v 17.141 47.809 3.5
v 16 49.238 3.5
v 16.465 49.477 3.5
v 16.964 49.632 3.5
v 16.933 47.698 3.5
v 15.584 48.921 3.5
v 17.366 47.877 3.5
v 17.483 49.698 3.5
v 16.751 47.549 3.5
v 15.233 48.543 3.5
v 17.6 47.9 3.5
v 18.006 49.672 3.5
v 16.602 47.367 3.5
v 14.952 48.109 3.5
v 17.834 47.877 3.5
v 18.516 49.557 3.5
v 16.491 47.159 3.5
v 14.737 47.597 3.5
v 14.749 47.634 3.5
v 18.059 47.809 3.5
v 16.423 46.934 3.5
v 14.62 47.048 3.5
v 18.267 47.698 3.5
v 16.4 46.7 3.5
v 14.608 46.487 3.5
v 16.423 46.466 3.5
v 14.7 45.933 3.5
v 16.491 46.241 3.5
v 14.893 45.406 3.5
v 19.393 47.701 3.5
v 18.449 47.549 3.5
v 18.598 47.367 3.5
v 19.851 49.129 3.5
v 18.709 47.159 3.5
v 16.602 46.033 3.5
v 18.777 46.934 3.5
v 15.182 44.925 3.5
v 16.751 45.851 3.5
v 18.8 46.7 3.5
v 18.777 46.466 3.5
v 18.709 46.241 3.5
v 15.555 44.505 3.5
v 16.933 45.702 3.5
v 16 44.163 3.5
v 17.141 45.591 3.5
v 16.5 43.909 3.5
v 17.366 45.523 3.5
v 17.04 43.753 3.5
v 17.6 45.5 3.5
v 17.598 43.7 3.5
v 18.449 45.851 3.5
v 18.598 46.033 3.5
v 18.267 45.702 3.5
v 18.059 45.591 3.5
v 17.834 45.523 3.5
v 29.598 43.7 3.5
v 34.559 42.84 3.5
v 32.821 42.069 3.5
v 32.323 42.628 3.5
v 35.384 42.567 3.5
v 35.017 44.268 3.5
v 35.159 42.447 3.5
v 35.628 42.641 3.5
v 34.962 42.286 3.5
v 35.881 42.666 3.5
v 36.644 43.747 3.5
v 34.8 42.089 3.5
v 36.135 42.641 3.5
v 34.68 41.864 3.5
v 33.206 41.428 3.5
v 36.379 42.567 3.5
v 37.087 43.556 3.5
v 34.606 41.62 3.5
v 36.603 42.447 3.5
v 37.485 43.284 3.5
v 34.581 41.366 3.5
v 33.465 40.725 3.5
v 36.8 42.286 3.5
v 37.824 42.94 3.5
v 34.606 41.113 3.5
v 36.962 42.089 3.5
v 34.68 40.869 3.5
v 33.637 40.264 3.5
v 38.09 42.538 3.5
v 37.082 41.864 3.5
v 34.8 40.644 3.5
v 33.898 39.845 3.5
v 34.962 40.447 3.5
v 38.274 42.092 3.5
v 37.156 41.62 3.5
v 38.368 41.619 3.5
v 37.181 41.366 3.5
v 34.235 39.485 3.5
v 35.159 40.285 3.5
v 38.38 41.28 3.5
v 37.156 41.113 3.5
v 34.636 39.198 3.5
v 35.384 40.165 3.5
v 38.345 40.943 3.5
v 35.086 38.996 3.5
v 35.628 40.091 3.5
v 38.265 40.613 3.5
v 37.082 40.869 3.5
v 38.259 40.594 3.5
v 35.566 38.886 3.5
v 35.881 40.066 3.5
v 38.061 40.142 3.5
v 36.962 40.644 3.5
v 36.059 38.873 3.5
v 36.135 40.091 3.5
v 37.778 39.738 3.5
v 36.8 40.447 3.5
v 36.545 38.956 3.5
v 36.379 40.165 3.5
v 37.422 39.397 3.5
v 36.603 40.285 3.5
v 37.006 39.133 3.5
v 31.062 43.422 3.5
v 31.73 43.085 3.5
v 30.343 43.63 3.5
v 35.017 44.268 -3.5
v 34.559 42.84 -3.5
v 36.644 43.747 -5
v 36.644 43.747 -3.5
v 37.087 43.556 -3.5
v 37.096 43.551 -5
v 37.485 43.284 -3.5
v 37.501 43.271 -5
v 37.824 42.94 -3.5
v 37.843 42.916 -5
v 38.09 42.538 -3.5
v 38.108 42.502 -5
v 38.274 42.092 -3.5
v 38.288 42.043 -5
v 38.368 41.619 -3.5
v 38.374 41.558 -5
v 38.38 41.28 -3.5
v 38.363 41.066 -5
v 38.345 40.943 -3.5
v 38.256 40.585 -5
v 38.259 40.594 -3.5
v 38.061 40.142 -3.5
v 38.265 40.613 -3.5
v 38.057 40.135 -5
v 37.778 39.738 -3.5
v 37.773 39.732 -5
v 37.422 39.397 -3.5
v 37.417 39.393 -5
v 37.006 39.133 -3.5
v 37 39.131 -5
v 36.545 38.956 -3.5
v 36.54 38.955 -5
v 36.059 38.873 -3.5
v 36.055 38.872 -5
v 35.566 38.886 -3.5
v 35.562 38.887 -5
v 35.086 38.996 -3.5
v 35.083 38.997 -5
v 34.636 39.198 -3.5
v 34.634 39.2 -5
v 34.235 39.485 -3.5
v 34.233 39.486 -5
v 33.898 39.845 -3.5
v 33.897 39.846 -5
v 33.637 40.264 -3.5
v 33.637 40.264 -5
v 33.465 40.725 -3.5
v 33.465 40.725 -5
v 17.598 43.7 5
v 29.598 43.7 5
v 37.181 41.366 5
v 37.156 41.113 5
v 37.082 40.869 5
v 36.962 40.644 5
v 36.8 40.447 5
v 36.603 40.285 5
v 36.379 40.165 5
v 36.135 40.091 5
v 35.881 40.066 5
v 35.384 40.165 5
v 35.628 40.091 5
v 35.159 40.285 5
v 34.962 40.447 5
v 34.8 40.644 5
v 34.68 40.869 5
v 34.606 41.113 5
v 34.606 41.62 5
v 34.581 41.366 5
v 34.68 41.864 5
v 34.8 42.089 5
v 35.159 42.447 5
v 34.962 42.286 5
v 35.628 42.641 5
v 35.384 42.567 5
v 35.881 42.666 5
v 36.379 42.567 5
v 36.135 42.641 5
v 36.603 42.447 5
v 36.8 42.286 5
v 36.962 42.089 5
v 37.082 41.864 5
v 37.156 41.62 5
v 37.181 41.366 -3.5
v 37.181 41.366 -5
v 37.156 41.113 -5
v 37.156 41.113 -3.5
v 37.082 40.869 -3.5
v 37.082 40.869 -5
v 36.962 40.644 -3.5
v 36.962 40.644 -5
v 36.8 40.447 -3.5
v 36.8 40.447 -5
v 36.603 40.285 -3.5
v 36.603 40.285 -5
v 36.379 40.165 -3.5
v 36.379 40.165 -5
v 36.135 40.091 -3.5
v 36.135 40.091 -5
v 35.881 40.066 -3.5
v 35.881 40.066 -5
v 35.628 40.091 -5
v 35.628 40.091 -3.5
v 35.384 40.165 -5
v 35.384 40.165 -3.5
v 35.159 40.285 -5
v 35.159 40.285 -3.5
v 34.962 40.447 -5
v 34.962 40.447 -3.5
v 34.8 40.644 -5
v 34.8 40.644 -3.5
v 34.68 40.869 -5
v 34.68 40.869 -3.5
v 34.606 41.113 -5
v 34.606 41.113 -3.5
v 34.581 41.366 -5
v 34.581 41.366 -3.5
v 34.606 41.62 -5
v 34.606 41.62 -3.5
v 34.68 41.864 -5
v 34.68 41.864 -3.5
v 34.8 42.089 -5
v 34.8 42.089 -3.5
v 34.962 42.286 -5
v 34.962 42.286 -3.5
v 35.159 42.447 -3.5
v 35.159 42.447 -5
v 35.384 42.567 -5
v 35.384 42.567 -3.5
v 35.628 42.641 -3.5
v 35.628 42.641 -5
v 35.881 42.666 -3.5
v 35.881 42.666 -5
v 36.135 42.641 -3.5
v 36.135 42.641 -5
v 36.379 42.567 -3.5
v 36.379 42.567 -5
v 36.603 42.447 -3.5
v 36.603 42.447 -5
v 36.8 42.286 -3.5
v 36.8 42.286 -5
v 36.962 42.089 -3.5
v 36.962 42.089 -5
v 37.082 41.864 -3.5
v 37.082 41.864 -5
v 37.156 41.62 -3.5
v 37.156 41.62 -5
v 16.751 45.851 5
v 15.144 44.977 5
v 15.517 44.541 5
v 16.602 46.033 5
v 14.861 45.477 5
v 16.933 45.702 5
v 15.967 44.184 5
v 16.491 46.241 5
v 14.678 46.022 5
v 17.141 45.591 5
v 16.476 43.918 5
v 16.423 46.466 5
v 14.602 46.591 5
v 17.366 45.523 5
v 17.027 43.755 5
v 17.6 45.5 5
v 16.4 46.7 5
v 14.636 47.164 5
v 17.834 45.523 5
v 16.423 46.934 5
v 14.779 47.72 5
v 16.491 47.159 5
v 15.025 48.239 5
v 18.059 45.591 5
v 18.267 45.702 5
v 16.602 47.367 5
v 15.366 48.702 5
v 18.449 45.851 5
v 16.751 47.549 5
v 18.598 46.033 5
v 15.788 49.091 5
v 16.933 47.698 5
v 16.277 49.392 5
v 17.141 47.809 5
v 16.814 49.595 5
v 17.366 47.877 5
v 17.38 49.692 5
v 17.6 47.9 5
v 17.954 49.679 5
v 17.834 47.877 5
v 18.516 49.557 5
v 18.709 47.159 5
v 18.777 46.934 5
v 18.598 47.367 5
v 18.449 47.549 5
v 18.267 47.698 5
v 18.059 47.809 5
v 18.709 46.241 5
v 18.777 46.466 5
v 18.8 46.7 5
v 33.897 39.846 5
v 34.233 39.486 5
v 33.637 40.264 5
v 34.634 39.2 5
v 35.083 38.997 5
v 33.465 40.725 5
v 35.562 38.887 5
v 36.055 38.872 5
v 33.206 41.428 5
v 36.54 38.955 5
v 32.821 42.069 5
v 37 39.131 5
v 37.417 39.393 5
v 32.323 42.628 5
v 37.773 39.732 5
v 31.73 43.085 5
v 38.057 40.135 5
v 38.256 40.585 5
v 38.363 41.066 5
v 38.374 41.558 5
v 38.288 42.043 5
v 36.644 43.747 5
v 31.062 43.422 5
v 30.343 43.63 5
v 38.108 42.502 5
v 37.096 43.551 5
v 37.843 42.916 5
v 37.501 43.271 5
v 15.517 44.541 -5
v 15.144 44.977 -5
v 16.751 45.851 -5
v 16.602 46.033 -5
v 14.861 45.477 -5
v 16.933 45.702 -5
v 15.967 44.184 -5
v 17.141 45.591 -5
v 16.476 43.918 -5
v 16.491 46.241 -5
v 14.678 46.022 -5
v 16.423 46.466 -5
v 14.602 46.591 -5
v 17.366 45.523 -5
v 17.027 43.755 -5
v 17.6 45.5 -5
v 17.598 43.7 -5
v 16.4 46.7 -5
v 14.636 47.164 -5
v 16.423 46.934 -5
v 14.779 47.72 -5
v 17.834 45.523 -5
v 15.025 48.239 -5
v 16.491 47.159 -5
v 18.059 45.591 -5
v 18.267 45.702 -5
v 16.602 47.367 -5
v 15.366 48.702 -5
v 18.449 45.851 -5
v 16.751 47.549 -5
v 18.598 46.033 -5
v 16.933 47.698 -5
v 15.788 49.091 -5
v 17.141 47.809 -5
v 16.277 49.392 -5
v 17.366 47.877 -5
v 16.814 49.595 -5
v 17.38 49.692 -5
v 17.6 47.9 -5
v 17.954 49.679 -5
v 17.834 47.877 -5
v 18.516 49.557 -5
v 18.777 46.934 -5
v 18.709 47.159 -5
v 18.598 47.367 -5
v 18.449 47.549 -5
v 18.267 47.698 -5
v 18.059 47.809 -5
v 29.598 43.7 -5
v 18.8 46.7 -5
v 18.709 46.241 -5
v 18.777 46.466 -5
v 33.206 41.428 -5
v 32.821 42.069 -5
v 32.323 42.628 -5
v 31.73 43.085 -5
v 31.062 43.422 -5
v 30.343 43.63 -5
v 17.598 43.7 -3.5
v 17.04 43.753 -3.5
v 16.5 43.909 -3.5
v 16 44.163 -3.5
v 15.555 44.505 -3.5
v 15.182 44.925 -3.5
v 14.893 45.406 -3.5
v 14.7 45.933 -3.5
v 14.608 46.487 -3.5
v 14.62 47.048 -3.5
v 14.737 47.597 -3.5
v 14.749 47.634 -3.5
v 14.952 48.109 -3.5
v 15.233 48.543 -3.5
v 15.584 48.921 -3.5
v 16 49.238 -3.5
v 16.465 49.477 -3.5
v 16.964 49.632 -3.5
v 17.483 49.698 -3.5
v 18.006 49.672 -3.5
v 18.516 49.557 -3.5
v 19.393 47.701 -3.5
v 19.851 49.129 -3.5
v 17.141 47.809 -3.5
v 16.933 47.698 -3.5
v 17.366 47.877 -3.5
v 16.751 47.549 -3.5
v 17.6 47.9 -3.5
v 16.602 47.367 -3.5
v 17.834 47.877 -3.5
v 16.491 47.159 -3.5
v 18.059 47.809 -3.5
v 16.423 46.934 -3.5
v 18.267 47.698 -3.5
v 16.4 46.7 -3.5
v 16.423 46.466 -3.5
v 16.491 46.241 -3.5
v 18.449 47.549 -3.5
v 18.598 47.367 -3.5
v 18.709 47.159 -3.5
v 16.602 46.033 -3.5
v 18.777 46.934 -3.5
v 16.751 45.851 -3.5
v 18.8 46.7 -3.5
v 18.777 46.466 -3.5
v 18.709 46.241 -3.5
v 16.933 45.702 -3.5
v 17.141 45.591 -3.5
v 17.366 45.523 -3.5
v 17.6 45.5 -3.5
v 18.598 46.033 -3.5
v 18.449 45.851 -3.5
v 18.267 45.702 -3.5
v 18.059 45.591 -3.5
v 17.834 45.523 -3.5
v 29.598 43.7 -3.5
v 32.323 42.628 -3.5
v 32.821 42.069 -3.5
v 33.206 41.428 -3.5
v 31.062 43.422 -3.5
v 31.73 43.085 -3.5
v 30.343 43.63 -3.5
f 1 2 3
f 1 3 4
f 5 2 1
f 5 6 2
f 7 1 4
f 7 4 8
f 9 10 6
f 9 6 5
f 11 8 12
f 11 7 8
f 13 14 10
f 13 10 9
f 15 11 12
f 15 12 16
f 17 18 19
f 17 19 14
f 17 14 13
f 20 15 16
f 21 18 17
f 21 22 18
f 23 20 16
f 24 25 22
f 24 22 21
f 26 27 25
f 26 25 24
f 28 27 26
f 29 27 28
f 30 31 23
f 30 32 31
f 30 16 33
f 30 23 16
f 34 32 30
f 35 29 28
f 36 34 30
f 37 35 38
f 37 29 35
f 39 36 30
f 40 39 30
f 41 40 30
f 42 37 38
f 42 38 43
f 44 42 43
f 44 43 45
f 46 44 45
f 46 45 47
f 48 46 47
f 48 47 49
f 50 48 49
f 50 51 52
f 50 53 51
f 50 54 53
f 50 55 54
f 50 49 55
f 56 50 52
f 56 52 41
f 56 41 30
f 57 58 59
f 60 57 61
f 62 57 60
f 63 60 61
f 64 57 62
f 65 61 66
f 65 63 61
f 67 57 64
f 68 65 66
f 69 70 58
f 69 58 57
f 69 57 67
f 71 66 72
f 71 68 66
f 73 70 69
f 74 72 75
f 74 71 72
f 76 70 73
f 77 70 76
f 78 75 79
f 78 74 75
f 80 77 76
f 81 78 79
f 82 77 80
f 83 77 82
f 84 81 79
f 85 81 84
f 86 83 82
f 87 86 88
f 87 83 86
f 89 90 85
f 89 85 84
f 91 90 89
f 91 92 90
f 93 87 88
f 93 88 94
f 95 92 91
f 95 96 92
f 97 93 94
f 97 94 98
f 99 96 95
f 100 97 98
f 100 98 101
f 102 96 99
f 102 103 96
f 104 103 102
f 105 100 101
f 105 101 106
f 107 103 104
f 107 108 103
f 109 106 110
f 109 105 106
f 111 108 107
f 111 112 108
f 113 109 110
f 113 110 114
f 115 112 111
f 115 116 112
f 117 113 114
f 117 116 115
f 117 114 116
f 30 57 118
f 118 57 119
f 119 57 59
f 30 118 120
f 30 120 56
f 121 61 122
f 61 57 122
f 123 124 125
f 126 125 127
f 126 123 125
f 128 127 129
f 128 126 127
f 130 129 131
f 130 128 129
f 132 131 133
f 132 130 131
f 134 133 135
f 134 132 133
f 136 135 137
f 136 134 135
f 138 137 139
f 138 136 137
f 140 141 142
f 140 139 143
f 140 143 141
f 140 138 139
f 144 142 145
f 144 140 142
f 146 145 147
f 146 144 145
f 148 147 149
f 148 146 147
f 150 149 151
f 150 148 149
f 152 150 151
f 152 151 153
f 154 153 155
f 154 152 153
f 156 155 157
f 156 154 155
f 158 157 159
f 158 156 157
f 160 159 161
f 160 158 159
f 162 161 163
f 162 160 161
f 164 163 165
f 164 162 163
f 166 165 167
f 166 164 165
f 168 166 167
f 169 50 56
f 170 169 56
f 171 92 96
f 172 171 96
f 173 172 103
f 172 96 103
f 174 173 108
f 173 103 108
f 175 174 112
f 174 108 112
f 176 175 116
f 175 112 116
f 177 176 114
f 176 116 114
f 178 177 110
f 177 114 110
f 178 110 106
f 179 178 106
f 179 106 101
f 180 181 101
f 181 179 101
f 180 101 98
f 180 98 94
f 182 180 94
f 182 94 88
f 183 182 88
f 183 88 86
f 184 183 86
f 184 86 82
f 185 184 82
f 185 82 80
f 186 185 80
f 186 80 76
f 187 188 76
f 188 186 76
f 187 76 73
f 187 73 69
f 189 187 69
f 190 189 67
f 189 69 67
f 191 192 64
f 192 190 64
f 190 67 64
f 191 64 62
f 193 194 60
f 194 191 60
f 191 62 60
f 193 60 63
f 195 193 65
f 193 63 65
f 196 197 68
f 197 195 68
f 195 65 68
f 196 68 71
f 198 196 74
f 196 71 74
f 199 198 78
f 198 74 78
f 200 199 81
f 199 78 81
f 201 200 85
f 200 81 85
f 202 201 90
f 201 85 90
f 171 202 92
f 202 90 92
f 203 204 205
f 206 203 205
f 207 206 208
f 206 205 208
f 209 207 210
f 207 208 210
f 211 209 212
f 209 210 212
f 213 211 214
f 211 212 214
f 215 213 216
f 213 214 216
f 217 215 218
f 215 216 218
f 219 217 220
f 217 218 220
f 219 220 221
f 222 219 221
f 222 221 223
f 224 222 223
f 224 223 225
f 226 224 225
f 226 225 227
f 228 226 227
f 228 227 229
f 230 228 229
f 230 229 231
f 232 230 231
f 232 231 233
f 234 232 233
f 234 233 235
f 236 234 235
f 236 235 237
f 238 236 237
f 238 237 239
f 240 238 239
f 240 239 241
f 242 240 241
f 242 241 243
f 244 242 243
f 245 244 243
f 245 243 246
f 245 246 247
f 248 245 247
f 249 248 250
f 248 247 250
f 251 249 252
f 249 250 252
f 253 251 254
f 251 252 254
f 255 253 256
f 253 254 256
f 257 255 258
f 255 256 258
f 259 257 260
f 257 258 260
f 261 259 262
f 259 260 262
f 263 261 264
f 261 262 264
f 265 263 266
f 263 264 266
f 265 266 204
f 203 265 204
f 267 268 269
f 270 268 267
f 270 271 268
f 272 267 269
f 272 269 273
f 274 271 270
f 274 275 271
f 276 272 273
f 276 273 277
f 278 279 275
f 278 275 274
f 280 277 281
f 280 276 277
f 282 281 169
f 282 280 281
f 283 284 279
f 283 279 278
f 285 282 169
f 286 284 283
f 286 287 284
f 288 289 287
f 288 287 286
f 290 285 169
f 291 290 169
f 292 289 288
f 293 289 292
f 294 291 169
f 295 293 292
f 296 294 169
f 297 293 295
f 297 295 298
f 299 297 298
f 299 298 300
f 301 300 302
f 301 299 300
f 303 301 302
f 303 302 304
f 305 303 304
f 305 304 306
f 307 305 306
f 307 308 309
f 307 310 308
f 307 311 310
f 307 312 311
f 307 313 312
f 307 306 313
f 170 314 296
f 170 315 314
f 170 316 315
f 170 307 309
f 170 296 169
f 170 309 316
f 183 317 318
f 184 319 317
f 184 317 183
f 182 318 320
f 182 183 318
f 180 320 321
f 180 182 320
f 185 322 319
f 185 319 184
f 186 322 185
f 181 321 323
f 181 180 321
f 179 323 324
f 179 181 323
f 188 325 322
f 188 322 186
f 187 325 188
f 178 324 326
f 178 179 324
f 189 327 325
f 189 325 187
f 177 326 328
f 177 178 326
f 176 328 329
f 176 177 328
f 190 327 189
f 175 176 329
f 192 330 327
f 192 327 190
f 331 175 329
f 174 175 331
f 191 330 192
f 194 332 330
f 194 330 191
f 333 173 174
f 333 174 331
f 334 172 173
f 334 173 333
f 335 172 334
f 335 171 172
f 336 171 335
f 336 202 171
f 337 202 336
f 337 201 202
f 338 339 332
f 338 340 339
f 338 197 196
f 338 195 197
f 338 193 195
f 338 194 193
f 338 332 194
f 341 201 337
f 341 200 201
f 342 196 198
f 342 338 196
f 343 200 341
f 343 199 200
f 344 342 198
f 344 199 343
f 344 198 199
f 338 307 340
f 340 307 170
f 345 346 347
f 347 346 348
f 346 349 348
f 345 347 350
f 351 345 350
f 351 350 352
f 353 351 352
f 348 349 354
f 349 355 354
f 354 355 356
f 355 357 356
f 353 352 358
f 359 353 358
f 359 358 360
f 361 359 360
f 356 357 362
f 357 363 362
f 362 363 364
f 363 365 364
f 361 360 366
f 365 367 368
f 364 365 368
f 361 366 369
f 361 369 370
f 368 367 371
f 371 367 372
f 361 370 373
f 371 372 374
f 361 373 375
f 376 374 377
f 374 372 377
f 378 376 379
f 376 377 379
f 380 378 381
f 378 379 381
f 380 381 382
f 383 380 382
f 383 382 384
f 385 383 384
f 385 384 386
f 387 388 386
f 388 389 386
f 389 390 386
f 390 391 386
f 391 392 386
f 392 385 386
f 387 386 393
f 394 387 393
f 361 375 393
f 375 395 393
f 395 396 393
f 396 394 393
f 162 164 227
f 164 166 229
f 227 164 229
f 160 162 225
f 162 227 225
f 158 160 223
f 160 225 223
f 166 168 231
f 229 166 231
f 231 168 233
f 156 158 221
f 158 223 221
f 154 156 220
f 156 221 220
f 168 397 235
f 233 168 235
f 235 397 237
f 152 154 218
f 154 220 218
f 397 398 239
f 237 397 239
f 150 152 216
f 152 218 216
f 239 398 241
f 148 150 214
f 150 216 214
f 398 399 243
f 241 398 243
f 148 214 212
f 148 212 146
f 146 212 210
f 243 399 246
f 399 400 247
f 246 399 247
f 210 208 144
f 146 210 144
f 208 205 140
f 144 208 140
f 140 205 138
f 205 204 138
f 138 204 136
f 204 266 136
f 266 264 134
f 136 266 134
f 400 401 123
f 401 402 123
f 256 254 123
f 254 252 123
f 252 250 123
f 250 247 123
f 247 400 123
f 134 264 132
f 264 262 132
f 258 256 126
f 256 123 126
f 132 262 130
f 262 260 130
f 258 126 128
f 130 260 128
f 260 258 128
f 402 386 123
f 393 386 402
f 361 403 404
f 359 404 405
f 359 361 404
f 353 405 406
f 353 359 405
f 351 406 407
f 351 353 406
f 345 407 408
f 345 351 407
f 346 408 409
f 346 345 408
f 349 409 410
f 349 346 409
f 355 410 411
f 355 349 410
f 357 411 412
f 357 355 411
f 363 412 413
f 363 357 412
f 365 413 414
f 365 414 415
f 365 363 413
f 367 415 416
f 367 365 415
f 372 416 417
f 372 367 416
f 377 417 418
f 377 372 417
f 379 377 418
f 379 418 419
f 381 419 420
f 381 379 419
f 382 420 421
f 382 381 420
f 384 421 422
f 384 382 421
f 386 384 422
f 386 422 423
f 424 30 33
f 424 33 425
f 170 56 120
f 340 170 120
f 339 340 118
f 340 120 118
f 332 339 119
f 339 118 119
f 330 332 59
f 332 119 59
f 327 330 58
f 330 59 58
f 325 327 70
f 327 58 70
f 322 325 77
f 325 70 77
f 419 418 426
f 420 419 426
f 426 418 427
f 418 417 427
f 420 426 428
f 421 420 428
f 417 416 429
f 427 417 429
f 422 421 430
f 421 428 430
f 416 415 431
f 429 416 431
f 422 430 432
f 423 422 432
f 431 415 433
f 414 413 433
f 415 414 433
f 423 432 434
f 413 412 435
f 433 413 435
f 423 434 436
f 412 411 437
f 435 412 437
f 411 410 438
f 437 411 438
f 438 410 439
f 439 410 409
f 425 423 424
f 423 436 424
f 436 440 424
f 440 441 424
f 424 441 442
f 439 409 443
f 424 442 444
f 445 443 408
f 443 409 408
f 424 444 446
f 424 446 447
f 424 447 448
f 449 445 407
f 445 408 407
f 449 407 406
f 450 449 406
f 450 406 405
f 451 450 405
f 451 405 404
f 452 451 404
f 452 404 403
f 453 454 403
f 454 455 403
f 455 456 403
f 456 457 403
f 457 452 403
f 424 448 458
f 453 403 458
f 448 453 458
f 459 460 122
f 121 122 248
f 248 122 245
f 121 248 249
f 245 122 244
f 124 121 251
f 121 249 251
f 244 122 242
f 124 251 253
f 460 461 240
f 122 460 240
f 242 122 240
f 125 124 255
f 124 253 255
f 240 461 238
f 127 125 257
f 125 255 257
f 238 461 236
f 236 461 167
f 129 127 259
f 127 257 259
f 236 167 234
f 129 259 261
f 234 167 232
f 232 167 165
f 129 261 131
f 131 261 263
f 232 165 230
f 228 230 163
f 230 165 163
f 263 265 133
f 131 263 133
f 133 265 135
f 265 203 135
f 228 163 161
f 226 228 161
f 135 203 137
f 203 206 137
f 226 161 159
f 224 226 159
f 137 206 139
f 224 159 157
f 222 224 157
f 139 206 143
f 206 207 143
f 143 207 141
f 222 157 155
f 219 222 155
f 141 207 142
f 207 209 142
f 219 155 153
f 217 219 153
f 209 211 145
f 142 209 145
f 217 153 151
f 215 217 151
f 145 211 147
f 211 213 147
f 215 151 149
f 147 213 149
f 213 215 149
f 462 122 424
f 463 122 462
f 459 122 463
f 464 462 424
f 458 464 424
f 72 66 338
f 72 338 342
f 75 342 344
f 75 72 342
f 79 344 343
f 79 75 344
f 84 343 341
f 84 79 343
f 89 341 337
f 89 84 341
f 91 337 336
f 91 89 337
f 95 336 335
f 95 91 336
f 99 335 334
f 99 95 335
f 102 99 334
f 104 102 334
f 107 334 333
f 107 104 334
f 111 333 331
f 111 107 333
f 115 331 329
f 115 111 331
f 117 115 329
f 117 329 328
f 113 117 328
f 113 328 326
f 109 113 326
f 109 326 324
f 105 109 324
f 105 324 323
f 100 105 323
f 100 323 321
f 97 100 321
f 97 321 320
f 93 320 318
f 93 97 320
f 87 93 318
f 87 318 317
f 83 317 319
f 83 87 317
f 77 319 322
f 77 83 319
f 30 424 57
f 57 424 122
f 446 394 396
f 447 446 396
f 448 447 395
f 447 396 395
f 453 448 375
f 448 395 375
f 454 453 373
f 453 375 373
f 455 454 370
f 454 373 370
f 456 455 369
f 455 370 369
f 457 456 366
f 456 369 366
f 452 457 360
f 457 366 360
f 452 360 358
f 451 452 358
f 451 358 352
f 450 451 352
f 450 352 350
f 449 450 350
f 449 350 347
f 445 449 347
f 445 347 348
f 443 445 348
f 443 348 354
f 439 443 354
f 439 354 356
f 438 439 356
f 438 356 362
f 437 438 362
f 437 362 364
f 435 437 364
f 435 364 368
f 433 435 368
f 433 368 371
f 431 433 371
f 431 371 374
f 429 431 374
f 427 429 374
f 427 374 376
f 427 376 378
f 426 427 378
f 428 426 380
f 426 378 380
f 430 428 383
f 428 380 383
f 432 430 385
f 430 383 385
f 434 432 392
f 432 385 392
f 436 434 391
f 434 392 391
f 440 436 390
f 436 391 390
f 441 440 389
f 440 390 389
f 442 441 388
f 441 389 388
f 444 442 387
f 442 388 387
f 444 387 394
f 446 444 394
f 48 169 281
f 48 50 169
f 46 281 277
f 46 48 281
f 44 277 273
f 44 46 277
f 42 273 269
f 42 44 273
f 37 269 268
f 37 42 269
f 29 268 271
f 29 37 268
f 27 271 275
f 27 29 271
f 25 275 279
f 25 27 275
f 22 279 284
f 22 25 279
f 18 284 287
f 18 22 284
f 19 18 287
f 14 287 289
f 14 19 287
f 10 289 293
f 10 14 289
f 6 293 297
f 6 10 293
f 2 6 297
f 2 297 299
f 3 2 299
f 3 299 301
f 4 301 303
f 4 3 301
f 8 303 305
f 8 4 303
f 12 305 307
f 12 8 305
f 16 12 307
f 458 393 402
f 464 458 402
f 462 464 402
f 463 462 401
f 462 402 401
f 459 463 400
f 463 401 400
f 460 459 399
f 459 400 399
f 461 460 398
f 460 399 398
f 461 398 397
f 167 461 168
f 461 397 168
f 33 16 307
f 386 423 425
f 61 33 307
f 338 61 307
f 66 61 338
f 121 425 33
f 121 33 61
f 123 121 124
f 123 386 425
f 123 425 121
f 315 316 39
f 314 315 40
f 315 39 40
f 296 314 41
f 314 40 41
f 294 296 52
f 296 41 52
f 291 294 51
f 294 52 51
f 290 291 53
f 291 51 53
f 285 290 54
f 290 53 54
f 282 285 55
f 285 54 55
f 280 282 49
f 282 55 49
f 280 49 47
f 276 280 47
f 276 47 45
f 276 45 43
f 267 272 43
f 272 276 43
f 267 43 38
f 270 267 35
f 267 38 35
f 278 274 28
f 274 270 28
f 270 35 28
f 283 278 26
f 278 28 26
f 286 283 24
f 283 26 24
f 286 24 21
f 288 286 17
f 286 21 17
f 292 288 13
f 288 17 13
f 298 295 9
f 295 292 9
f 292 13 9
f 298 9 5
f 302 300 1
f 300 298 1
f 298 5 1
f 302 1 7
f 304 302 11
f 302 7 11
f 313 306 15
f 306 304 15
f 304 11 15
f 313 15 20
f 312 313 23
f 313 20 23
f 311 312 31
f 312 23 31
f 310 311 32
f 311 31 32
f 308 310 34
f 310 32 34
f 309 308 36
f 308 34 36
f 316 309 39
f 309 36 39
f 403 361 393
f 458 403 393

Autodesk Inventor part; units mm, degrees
ref_plane "YZ Plane" through (0, 0, 0) normal (1, 0, 0) x (0, 1, 0)
ref_plane "XZ Plane" through (0, 0, 0) normal (0, 1, 0) x (-1, 0, 0)
sketch "Sketch1" plane through (0, 0, 0) normal (0, 0, 1) x (1, 0, 0)
  circle A0 centre (17.6, 46.7) radius 1.2
  circle A1 centre (35.8812, 41.3663) radius 1.3
  arc A2 (18.5156, 49.5569) -> (17.5984, 43.7) centre (17.6, 46.7) ccw
  arc A3 (33.4647, 40.7254) -> (36.6442, 43.747) centre (35.8812, 41.3663) ccw
  line L0 (18.5156, 49.5569) -> (36.6442, 43.747)
  line L1 (17.5984, 43.7) -> (29.5984, 43.7)
  arc A4 (33.4647, 40.7254) -> (29.5984, 43.7) centre (29.5984, 39.7) ccw
  point P0 (0, 0)
  dimension "d0" = 5
  dimension "d1" = 3
  dimension "d3" = 4
  dimension "d14" = 12
extrude "Extrusion1" add sketch "Sketch1" along normal mid plane 10
ref_plane "Work Plane1" through (36.1864, 42.3186, 5) normal (0.3051918, 0.9522909, 0) x (0.9522909, -0.3051918, 0)
sketch "Sketch2" plane through (36.1864, 42.3186, 5) normal (0.3051918, 0.9522909, 0) x (0.9522909, -0.3051918, 0)
  line L0 (8.5468, 5) -> (-28.0353, 5) projected
  line L1 (-22.0368, 8.5) -> (2.5, 8.5)
  line L2 (2.5, 8.5) -> (2.5, 1.5)
  line L3 (2.5, 1.5) -> (-22.0368, 1.5)
  line L4 (-22.0368, 1.5) -> (-22.0368, 8.5)
  line L5 (2.5, 10) -> (2.5, 0) projected
  line L6 (-22.0368, 10) -> (-22.0368, 0) projected
  point P0 (-21.5447, 5)
  dimension "d7" = 7
extrude "Extrusion2" cut sketch "Sketch2" against normal through all
sketch "Sketch3" plane through (36.1864, 42.3186, 5) normal (-0.3051918, -0.9522909, 0) x (0.9522909, -0.3051918, 0)
  line L0 (-21.6349, -8.5) -> (-21.6349, -1.5) projected
  line L1 (-21.6349, -8.5) -> (2.2913, -8.5) projected
  line L2 (2.2913, -1.5) -> (2.2913, -8.5) projected
  line L3 (-21.6349, -1.5) -> (-17.6349, -1.5)
  line L4 (-17.6349, -1.5) -> (-17.6349, -8.5)
  line L5 (-17.6349, -8.5) -> (-21.6349, -8.5)
  line L6 (-21.6349, -8.5) -> (-21.6349, -1.5)
  line L7 (2.2913, -1.5) -> (-1.7087, -1.5)
  line L8 (-1.7087, -1.5) -> (-1.7087, -8.5)
  line L9 (-1.7087, -8.5) -> (2.2913, -8.5)
  line L10 (2.2913, -8.5) -> (2.2913, -1.5)
  point P0 (-21.5447, -5)
  dimension "d10" = 4
  dimension "d11" = 4
extrude "Extrusion3" cut sketch "Sketch3" against normal through all
properties part number "Lever for inset hinge" material "Steel"
